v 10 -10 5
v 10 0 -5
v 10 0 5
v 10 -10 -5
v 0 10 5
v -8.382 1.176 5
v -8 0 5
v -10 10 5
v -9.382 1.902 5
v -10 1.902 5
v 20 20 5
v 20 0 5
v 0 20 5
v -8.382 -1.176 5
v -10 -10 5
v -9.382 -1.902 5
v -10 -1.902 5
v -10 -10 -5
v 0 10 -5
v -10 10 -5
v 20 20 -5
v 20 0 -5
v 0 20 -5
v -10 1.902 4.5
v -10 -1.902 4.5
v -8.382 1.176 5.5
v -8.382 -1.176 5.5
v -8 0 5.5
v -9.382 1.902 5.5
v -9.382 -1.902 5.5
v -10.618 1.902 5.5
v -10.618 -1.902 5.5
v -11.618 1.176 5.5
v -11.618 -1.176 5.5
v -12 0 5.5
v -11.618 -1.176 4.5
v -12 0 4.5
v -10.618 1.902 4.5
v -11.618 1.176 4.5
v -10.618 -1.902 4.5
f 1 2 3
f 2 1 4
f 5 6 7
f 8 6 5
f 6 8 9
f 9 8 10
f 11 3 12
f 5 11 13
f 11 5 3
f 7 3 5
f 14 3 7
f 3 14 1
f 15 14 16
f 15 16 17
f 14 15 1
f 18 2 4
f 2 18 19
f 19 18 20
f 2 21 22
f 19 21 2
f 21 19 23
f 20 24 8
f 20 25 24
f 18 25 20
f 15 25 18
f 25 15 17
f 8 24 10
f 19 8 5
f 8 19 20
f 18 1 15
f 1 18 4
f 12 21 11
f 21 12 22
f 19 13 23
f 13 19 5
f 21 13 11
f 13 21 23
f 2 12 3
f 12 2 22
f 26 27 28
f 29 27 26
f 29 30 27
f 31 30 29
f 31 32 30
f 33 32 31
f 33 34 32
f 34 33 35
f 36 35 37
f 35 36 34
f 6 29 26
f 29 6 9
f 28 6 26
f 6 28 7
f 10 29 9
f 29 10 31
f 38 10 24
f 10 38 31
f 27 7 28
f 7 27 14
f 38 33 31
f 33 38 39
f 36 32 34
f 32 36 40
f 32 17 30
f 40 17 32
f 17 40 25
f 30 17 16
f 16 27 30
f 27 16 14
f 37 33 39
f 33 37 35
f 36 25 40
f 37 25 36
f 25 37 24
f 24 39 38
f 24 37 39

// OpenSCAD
// file: 13.Cilindros condicionales.scad
//-- Cilindro redondeado en las tapas
module rcylinder(
    r=4,
    h=20,
    center=false,
    both=false,
    $fn=30,
){
    //-- Calcular altura cilindro interior:
    //-- 2 tapas: h-2*r
    //-- 1 tapa: h-r
    hc=(both==true) ? h-2*r : h-r;

    //-- Calcular traslación para centrar el cilindro
    posc=(center==true) ? 0 : h/2;

    //-- Aplicar traslación para el centrado
    translate([0,0,posc]){
        if(both==true){
            //-- Cilindro con ambas tapas redondeadas
            cylinder(r=r,h=hc,center=true,$fn=$fn);
            //-- Esferas
            for(i=[-1,1])
                translate([0,0,i*hc/2])
                    sphere(r=r);
        }else{
            //-- Cilindro con una tapa redondeada
            translate([0,0,-h/2]){
                cylinder(r=r,h=hc,$fn=$fn);
                translate([0,0,hc])
                    sphere(r=r,$fn=$fn);
            }
        }
    }
}

//-- Ejemplos
r=5;
h=30;
center=false;
$fn=30;

//-- Cilindro normal
translate([-3*r,0,0])
    cylinder(r=r,h=h,center=center,$fn=$fn);

//-- Cilindro con tapa superior redondeada
rcylinder(r=r,h=h,both=false,center=center,$fn=$fn);

//-- Cilindro con ambas tapas redondeadas
translate([3*r,0,0])
    rcylinder(r=r,h=h,both=true,center=center,$fn=$fn);
// main file
use <13.Cilindros condicionales.scad>

X=0;
Y=1;
Z=2;

size=[20,20,10];
r=2;

//-- Pieza de ejemplo Minkowski
module pieza(){
    cube(size,center=true);

    translate([10,10,0])
        cube(size,center=true);
}

//-- Aplicar Minkowski
%minkowski(){
    pieza();

    cylinder(r=r,h=1,center=true,$fn=10);
    //sphere(r=r,$fn=10);
    //rcylinder(r=r,h=2*r,both=false,center=true,$fn=10);
}

//-- Pieza original
pieza();

//-- La otra pieza
color("red")
    translate([-size[X]/2,0,size[Z]/2])
        cylinder(r=r,h=1,center=true,$fn=10);
        //sphere(r=r,$fn=10);
        //rcylinder(r=r,h=2*r,both=false,center=true,$fn=10);
